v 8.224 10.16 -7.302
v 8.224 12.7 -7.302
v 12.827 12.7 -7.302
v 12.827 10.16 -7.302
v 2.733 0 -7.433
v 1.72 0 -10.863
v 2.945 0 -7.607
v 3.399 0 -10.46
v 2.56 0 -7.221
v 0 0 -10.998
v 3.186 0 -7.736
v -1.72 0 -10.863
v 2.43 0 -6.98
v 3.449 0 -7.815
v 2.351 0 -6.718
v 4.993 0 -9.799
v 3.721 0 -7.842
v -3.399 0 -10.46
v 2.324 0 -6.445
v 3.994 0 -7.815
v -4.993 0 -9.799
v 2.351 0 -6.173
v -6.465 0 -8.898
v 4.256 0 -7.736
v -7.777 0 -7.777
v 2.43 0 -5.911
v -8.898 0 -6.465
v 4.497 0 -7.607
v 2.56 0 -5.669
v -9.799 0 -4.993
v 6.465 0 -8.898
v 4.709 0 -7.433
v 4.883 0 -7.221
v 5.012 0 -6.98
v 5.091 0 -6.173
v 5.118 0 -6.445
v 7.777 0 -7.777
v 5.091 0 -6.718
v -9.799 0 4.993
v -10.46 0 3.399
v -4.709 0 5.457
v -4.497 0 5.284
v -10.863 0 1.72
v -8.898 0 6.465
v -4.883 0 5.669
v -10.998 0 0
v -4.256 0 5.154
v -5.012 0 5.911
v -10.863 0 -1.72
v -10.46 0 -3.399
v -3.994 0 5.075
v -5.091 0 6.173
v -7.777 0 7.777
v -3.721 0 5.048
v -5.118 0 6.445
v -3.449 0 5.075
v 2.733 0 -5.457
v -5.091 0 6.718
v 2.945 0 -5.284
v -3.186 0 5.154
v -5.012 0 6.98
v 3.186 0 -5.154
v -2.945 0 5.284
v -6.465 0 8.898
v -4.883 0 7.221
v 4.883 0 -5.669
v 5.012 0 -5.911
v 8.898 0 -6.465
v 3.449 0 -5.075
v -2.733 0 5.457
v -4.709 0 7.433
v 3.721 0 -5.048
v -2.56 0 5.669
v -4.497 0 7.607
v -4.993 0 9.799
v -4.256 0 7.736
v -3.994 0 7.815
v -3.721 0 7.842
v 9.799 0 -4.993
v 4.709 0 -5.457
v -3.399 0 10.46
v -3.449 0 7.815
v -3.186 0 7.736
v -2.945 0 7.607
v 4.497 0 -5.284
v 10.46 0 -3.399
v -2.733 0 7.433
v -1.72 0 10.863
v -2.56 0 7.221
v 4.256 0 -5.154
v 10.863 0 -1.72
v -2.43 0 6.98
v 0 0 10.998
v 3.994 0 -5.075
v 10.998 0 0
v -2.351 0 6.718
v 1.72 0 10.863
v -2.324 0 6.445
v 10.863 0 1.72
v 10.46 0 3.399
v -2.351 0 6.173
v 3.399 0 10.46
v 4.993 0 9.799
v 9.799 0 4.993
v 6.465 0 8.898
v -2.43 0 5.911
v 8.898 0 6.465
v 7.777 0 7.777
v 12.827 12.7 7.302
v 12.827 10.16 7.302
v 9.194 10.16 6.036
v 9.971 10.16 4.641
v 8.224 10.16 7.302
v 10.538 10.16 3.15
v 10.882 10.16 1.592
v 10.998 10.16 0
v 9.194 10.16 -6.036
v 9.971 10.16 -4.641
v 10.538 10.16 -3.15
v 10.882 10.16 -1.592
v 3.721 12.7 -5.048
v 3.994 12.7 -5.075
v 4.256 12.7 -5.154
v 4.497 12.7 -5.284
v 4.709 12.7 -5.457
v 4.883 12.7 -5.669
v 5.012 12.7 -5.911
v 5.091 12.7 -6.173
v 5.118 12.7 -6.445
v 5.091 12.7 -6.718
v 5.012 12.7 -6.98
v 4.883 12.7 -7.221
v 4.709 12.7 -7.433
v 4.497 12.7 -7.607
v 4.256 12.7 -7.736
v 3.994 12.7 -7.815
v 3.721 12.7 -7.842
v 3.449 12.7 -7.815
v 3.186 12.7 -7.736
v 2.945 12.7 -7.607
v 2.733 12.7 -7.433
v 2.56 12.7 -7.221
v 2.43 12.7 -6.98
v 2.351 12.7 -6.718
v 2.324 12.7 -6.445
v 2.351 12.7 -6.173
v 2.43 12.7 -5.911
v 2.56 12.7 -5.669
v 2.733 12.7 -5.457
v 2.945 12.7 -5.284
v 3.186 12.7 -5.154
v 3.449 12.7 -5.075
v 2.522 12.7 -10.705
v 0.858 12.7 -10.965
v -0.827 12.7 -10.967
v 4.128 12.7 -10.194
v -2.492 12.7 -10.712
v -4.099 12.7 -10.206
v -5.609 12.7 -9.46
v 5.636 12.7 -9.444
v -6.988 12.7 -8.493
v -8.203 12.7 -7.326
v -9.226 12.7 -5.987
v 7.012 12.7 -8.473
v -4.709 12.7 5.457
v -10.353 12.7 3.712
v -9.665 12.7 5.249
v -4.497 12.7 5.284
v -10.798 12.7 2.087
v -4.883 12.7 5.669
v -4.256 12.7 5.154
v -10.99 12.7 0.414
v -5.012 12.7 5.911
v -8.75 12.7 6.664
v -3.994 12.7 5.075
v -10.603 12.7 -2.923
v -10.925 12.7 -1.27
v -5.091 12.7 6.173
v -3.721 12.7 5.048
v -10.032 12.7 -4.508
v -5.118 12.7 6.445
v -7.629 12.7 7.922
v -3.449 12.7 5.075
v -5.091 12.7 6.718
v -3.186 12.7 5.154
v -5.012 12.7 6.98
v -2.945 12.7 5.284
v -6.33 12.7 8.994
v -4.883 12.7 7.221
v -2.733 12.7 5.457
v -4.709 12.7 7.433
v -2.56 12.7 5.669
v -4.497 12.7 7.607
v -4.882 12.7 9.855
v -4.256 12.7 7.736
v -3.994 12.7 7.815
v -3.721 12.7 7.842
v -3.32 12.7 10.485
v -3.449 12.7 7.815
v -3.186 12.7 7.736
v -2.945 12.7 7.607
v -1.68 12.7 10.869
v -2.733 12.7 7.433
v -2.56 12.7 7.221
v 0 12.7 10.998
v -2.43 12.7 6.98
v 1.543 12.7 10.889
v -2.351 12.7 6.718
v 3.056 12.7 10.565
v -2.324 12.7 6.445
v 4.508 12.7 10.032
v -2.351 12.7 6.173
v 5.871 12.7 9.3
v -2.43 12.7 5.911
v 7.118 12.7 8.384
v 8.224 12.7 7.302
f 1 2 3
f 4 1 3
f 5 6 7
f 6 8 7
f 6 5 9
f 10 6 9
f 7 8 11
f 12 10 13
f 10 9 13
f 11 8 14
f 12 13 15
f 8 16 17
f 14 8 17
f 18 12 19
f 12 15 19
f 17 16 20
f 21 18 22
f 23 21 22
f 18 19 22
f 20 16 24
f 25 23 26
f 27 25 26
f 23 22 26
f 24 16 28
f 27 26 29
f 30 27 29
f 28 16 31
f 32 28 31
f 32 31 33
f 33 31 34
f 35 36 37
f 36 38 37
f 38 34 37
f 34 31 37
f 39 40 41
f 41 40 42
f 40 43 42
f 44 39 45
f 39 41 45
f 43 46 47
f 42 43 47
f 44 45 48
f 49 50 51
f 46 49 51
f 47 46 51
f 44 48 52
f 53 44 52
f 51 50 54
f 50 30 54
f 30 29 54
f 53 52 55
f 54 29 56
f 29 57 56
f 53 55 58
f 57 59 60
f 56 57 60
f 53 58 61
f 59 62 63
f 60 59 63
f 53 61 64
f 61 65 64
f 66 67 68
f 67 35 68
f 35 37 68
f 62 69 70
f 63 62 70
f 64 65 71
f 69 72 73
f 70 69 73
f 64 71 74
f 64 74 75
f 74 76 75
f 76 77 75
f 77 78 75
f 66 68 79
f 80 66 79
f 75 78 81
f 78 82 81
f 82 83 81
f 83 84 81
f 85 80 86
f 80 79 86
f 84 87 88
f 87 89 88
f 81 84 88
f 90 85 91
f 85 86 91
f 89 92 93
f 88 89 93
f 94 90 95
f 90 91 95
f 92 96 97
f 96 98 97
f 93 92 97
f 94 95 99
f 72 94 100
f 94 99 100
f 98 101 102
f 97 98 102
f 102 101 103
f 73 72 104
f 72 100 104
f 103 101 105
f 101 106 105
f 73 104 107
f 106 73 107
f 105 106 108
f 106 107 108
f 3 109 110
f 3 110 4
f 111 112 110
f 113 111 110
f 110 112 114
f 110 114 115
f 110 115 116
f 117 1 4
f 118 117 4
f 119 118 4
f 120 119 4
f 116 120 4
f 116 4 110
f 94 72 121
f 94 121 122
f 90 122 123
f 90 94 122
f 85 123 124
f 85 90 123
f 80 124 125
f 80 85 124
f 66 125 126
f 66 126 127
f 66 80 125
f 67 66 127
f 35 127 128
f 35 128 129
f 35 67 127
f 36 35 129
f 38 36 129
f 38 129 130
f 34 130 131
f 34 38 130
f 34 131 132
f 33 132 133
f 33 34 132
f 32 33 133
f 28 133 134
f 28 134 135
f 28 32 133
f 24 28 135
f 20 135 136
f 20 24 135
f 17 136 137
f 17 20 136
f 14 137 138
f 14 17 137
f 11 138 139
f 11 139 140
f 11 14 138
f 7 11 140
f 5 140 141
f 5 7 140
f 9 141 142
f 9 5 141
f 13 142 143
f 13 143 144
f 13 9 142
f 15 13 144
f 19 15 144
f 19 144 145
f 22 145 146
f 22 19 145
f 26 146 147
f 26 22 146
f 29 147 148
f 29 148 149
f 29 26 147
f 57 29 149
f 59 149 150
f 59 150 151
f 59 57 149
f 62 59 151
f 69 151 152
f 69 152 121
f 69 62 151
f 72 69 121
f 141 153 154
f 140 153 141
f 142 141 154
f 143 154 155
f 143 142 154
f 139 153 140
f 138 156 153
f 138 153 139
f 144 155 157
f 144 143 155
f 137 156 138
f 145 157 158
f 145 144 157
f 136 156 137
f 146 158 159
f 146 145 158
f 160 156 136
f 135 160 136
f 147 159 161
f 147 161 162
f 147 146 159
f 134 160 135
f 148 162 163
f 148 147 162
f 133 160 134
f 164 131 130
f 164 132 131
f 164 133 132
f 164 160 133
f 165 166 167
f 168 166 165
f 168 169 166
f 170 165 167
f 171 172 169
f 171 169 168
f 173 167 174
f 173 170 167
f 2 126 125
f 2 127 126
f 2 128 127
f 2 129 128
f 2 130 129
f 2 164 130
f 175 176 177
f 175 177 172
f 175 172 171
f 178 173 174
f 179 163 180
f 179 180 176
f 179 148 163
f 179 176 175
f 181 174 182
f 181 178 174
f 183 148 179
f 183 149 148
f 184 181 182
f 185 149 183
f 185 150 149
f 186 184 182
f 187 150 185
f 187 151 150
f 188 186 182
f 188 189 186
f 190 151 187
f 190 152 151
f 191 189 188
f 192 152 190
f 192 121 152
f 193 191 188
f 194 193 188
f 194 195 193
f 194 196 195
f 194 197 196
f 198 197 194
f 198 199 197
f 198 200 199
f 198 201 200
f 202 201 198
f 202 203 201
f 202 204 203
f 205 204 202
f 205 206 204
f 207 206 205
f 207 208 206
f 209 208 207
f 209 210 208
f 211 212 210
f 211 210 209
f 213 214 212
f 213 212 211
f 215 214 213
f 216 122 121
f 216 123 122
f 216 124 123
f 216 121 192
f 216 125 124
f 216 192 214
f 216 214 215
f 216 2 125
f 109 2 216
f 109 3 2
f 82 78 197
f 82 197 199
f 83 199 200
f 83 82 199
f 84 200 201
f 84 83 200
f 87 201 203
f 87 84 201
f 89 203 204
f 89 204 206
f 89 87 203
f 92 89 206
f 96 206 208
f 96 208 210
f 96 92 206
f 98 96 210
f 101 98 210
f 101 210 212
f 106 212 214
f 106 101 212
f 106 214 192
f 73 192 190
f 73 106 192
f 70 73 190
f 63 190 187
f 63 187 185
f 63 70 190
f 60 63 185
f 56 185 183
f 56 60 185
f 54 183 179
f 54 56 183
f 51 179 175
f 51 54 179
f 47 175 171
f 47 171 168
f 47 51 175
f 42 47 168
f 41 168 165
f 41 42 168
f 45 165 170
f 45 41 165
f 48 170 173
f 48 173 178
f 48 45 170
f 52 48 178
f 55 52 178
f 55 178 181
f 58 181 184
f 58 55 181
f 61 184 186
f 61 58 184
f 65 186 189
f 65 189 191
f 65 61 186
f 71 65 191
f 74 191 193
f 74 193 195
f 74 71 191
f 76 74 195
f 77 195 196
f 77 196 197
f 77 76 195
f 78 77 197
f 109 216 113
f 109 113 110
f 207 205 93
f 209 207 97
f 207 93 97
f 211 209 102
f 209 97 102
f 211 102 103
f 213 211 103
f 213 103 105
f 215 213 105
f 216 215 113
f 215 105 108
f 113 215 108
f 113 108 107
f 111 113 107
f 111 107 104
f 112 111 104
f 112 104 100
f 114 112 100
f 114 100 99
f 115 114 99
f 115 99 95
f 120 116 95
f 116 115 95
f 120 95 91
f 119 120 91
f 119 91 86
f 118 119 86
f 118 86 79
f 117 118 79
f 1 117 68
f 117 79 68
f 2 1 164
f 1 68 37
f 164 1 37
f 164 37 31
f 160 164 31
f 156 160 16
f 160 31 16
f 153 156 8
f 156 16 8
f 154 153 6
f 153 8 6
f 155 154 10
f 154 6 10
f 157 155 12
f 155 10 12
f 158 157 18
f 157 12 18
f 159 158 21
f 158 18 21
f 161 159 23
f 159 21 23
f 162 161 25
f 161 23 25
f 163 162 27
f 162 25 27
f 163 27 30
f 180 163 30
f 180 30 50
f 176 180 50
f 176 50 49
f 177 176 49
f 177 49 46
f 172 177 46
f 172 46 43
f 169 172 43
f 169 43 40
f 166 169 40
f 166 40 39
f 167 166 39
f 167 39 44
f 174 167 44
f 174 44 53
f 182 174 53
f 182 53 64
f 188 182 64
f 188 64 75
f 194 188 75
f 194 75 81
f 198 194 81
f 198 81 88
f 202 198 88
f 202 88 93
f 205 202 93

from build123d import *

# Parameters (mm, degrees)
SKETCH1_R           = 10.9982
SKETCH1_R_2         = 1.397
BOSS_EXTRUDE1_DEPTH = 12.7
SKETCH2_W           = 4.603016963
SKETCH2_H           = 14.605
BOSS_EXTRUDE2_DEPTH = 2.54


with BuildPart() as part:
    # Sketch1 → Boss-Extrude1 (new body)
    with BuildSketch(Plane(origin=(0, 0, 0), x_dir=(1, 0, 0), z_dir=(0, 1, 0))):
        with Locations(Location((0, 0, 0), (0, 0, 270))):
            Circle(SKETCH1_R)
        with Locations(Location((3.7211, 6.44513426, 0), (0, 0, 270))):
            Circle(SKETCH1_R_2, mode=Mode.SUBTRACT)
        with Locations(Location((-3.7211, -6.44513426, 0), (0, 0, 270))):
            Circle(SKETCH1_R_2, mode=Mode.SUBTRACT)
    extrude(amount=BOSS_EXTRUDE1_DEPTH)

    # Sketch2 → Boss-Extrude2 (add)
    with BuildSketch(Plane(origin=(0, 12.7, 0), x_dir=(1, 0, 0), z_dir=(0, 1, 0))):
        with Locations((10.525491519, 0)):
            Rectangle(SKETCH2_W, SKETCH2_H)
    extrude(amount=-BOSS_EXTRUDE2_DEPTH)


solid = part.part
